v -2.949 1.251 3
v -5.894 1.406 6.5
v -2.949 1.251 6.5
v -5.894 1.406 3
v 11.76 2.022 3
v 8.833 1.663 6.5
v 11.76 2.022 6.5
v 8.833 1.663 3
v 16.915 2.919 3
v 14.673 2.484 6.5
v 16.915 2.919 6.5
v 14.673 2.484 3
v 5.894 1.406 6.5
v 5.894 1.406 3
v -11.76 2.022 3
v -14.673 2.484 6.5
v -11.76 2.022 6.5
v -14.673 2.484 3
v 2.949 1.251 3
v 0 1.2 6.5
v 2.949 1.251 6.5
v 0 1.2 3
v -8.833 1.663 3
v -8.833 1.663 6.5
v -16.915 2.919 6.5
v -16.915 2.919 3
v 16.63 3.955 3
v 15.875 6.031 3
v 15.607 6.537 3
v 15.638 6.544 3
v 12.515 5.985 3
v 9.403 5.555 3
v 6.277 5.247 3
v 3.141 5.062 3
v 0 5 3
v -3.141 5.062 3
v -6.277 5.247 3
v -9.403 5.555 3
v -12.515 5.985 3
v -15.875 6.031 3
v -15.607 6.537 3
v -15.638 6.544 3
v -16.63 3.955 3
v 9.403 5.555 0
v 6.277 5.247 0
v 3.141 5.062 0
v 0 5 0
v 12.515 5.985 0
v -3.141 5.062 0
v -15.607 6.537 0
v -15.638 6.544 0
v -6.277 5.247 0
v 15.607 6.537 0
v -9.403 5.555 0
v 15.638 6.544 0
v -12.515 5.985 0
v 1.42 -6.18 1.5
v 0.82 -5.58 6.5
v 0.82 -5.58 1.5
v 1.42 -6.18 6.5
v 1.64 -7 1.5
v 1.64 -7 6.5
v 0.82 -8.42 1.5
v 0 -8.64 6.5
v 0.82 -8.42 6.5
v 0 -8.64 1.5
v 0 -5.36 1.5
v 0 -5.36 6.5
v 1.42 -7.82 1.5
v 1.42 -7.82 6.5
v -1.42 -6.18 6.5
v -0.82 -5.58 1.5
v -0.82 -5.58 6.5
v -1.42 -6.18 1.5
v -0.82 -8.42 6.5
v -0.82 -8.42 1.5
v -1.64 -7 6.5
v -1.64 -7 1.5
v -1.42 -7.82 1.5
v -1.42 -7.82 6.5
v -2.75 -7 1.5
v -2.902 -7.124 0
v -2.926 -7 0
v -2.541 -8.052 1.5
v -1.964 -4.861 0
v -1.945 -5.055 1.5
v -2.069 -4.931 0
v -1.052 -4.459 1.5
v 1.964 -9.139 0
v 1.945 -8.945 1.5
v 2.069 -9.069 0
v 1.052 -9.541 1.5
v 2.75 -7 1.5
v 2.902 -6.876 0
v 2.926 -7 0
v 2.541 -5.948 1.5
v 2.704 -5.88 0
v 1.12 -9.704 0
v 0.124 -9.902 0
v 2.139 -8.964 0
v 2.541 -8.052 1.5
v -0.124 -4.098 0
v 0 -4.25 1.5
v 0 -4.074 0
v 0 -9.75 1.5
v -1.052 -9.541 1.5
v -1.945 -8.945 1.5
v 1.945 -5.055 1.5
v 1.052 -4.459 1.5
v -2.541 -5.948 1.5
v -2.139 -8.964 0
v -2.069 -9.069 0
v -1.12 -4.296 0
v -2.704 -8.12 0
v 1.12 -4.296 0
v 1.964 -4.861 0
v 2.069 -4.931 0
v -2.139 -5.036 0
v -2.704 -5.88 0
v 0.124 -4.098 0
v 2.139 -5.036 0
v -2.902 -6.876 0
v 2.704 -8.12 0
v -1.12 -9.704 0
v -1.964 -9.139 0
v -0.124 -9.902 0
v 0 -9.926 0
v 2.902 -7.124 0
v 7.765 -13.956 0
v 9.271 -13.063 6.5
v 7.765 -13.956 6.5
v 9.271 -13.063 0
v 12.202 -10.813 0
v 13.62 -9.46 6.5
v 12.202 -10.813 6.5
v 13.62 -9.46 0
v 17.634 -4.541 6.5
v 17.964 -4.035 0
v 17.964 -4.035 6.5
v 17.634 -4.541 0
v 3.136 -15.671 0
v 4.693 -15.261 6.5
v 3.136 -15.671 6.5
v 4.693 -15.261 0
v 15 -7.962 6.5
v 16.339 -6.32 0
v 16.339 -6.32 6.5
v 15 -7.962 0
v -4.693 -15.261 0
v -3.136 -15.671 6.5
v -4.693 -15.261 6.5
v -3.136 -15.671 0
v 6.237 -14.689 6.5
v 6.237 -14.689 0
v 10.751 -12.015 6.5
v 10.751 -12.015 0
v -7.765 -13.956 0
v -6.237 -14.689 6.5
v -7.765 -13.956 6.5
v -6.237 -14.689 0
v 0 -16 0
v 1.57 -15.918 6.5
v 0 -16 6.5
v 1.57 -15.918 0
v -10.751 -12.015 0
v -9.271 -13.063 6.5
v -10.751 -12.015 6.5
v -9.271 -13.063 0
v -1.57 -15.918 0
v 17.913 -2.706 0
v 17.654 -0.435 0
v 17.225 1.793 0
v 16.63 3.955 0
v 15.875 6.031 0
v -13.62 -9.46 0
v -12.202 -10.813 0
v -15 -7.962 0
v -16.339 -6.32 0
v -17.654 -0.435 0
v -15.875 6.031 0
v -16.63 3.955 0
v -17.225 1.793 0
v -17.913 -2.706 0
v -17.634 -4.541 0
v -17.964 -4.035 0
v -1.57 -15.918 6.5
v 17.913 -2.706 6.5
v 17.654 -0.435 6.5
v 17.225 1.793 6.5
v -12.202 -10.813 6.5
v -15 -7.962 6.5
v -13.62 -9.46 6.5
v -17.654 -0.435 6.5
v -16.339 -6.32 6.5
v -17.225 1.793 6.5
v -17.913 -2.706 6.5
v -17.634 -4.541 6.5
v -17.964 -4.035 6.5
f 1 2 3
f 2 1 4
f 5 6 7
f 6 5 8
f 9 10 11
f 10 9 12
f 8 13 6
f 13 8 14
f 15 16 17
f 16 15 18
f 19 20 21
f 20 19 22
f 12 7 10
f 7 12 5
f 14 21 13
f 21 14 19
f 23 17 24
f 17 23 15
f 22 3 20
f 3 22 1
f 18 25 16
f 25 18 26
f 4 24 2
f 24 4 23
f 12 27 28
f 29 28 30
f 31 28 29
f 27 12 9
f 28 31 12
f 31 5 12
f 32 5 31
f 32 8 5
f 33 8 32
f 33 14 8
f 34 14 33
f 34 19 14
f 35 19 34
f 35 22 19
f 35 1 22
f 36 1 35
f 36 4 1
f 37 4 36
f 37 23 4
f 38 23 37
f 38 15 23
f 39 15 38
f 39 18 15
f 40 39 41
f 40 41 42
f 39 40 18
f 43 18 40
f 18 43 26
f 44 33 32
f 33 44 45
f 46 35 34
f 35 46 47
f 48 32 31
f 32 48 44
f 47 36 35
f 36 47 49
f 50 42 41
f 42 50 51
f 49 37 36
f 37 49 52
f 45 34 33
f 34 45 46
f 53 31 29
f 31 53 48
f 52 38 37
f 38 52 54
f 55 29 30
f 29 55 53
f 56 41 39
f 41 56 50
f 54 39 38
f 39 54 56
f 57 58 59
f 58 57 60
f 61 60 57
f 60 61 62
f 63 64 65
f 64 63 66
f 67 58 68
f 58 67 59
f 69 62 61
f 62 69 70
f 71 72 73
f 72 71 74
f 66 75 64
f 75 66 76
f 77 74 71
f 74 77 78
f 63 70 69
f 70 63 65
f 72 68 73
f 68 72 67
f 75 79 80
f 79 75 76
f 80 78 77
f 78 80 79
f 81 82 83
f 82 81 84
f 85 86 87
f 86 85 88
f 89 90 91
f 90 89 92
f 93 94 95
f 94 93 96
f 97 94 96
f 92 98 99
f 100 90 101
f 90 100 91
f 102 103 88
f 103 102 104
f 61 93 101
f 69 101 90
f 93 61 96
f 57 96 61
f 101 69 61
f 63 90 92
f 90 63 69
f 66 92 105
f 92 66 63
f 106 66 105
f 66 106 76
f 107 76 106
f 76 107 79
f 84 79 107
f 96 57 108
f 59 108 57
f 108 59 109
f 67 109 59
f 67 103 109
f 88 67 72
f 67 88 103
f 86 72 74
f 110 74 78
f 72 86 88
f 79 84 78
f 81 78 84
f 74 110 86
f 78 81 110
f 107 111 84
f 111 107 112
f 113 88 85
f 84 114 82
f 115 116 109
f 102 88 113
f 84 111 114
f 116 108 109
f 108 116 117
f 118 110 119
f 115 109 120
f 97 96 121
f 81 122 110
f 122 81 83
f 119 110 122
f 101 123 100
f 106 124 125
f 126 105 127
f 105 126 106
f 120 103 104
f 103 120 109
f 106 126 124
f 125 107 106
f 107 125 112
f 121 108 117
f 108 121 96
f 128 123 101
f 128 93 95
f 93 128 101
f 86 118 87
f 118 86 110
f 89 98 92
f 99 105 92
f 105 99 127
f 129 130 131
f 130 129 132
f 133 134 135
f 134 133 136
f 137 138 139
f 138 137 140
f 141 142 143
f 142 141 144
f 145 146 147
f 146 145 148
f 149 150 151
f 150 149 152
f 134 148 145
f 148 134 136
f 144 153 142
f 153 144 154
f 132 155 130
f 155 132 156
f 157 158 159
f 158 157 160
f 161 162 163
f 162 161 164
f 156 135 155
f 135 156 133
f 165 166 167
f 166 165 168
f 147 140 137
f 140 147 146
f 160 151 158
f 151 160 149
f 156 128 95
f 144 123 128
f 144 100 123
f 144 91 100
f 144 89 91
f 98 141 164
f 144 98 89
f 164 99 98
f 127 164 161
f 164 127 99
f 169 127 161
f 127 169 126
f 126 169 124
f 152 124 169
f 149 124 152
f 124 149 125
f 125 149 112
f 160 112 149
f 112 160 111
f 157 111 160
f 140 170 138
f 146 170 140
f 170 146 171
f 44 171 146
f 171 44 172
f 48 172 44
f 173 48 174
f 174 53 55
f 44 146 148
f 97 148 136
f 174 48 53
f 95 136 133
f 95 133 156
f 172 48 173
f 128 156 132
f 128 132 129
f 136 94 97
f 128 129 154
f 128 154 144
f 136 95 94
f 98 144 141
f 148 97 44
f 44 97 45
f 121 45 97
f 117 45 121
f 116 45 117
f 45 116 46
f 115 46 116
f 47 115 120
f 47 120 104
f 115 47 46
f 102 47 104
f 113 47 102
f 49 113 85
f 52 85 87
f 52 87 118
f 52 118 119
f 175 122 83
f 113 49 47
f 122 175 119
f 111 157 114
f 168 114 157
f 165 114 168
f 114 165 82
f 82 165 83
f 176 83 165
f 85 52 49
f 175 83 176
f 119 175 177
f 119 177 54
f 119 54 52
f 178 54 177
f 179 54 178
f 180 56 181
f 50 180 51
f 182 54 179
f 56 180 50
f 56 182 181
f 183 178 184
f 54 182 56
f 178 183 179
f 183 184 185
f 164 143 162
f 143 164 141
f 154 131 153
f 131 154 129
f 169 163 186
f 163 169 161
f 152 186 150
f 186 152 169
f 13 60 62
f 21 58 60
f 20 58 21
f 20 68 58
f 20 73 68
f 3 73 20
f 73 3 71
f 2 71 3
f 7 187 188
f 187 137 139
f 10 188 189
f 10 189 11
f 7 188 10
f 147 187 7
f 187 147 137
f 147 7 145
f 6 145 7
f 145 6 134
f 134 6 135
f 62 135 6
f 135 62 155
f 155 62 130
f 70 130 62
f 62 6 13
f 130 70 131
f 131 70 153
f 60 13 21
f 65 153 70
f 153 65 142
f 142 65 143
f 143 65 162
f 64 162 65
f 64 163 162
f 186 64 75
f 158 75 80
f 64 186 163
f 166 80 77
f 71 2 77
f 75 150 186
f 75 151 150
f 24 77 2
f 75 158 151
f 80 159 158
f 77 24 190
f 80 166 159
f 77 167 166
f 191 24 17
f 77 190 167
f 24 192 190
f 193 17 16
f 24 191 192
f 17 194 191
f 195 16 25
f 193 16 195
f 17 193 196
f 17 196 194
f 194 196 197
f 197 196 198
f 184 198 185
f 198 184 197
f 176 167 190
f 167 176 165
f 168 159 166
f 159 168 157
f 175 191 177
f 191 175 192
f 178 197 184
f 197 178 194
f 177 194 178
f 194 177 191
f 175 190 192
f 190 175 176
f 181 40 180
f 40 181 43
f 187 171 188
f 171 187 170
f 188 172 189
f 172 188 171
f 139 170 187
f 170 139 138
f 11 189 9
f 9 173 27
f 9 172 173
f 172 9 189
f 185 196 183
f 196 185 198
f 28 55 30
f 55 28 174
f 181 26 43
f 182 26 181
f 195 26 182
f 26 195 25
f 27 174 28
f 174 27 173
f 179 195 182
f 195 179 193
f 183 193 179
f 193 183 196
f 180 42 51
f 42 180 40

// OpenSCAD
// Glass print bed holder for silly 170mm diameter plate, that almost
// fits INSIDE rails.

m3threadOD = 2.88;
intersection(){
  translate([0,-5,-1]) scale([1,1.3,1]) cylinder(r=18,h=9,$fn=64);
  difference() {
    translate([0,44,0]) scale([1,2,1]) cylinder(r=30,h=3+3.5,$fn=120);
    translate([0,170/2,3]) {
      // make this a little too small, so that we can mount with screw
      // slightly off perfect perpendicular to give some slop/freedom
      translate([0,0.7,0])
        cylinder(r=170/2-.5,h=4,$fn=180);
      translate([0,0,-4]) cylinder(r=160/2,h=8,$fn=160);
    }
    translate([0, -7,-.2]) {
      cylinder(r=(m3threadOD/2)+.2,h=9,$fn=12);
      cylinder(r1=5.9/2,r2=5.5/2,h=1.7,$fn=16); // countersink screw head
    }
  }
}
